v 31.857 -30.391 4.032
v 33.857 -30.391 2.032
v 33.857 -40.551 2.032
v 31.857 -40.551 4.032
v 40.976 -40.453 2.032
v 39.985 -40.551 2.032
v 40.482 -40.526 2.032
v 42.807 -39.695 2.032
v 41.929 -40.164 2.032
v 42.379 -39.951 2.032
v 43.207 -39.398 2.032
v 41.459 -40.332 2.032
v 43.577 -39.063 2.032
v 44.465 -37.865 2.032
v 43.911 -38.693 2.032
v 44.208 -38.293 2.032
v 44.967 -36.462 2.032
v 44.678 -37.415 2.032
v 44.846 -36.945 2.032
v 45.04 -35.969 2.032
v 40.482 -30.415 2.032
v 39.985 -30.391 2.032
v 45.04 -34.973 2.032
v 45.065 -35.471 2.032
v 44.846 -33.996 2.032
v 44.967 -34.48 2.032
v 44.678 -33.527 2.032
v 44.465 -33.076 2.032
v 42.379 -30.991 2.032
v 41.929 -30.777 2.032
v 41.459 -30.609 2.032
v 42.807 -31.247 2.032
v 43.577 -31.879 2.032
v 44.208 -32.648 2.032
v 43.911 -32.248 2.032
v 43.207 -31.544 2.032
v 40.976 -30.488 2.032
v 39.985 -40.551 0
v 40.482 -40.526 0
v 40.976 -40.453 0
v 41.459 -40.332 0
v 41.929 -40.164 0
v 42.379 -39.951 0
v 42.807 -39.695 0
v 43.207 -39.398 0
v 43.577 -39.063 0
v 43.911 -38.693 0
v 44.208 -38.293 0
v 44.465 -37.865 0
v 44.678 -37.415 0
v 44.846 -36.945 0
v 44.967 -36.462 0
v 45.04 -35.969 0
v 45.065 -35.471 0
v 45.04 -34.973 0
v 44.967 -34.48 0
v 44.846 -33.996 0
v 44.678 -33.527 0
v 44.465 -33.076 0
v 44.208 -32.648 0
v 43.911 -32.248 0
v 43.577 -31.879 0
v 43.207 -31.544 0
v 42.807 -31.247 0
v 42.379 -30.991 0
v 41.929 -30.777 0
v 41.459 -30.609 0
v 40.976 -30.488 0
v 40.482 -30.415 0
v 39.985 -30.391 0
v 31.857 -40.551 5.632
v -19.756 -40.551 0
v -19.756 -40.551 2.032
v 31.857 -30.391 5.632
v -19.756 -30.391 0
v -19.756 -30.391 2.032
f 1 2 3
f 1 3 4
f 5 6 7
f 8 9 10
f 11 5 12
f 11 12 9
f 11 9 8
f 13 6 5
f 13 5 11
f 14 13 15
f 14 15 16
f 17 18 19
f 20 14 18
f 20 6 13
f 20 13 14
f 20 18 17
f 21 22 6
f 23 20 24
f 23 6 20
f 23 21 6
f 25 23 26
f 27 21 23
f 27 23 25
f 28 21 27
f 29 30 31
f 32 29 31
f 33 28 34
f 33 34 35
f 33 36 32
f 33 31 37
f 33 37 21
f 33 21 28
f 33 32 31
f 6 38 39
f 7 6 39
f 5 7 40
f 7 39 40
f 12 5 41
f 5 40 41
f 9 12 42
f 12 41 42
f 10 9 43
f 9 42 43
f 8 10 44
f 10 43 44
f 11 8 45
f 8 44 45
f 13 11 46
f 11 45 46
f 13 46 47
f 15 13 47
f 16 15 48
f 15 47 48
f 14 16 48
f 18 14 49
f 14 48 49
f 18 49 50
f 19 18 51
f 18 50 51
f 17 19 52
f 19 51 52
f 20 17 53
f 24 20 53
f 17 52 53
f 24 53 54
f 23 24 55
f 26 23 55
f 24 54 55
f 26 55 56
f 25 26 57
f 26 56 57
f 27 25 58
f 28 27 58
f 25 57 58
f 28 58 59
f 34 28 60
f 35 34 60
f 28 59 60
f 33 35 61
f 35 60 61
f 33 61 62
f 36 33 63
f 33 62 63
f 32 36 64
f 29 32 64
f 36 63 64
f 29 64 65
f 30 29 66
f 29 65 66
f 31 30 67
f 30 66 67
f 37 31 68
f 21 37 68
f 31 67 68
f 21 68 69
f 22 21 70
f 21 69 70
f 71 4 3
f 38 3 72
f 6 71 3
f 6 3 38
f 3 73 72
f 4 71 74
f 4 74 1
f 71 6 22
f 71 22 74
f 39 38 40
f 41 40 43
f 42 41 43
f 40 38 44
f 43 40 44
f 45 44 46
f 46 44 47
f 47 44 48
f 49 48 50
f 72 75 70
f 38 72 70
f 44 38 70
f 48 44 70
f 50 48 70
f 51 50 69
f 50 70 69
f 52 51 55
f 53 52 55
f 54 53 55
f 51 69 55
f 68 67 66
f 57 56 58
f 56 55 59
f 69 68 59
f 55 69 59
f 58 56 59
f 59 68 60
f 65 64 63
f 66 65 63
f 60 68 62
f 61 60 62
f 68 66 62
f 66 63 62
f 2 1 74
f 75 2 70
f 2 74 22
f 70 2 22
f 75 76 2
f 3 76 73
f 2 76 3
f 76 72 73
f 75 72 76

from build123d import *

# Parameters (mm, degrees)
F0_W     = 59.7408
F0_H     = 10.16
F1_DEPTH = 2.032
F4_DEPTH = 10.16
F6_DEPTH = 10.161


with BuildPart() as f1:
    # F0 (on Top) → F1 (new body)
    with BuildSketch(Plane.XY):
        with Locations((10.114113, -35.470716)):
            Rectangle(F0_W, F0_H)
        with BuildLine():
            ThreePointArc((39.984513, -40.550716), (45.064513, -35.470716), (39.984513, -30.390716))
            Line((39.984513, -30.390716), (39.984513, -40.550716))
        make_face()
    extrude(amount=F1_DEPTH)

    # F3 (on face) → F4 (join)
    with BuildSketch(Plane.XZ.offset(40.550716)):
        Polygon((31.856513, 2.032), (39.984513, 2.032), (31.856513, 5.632), align=None)
    extrude(amount=-F4_DEPTH)

    # F5 (on face) → F6 (cut, through all)
    with BuildSketch(Plane.XZ.offset(40.550716)):
        Polygon((33.856513, 2.032), (31.856513, 4.032), (31.856513, 2.032), align=None)
    extrude(amount=-F6_DEPTH, mode=Mode.SUBTRACT)


solid = f1.part
